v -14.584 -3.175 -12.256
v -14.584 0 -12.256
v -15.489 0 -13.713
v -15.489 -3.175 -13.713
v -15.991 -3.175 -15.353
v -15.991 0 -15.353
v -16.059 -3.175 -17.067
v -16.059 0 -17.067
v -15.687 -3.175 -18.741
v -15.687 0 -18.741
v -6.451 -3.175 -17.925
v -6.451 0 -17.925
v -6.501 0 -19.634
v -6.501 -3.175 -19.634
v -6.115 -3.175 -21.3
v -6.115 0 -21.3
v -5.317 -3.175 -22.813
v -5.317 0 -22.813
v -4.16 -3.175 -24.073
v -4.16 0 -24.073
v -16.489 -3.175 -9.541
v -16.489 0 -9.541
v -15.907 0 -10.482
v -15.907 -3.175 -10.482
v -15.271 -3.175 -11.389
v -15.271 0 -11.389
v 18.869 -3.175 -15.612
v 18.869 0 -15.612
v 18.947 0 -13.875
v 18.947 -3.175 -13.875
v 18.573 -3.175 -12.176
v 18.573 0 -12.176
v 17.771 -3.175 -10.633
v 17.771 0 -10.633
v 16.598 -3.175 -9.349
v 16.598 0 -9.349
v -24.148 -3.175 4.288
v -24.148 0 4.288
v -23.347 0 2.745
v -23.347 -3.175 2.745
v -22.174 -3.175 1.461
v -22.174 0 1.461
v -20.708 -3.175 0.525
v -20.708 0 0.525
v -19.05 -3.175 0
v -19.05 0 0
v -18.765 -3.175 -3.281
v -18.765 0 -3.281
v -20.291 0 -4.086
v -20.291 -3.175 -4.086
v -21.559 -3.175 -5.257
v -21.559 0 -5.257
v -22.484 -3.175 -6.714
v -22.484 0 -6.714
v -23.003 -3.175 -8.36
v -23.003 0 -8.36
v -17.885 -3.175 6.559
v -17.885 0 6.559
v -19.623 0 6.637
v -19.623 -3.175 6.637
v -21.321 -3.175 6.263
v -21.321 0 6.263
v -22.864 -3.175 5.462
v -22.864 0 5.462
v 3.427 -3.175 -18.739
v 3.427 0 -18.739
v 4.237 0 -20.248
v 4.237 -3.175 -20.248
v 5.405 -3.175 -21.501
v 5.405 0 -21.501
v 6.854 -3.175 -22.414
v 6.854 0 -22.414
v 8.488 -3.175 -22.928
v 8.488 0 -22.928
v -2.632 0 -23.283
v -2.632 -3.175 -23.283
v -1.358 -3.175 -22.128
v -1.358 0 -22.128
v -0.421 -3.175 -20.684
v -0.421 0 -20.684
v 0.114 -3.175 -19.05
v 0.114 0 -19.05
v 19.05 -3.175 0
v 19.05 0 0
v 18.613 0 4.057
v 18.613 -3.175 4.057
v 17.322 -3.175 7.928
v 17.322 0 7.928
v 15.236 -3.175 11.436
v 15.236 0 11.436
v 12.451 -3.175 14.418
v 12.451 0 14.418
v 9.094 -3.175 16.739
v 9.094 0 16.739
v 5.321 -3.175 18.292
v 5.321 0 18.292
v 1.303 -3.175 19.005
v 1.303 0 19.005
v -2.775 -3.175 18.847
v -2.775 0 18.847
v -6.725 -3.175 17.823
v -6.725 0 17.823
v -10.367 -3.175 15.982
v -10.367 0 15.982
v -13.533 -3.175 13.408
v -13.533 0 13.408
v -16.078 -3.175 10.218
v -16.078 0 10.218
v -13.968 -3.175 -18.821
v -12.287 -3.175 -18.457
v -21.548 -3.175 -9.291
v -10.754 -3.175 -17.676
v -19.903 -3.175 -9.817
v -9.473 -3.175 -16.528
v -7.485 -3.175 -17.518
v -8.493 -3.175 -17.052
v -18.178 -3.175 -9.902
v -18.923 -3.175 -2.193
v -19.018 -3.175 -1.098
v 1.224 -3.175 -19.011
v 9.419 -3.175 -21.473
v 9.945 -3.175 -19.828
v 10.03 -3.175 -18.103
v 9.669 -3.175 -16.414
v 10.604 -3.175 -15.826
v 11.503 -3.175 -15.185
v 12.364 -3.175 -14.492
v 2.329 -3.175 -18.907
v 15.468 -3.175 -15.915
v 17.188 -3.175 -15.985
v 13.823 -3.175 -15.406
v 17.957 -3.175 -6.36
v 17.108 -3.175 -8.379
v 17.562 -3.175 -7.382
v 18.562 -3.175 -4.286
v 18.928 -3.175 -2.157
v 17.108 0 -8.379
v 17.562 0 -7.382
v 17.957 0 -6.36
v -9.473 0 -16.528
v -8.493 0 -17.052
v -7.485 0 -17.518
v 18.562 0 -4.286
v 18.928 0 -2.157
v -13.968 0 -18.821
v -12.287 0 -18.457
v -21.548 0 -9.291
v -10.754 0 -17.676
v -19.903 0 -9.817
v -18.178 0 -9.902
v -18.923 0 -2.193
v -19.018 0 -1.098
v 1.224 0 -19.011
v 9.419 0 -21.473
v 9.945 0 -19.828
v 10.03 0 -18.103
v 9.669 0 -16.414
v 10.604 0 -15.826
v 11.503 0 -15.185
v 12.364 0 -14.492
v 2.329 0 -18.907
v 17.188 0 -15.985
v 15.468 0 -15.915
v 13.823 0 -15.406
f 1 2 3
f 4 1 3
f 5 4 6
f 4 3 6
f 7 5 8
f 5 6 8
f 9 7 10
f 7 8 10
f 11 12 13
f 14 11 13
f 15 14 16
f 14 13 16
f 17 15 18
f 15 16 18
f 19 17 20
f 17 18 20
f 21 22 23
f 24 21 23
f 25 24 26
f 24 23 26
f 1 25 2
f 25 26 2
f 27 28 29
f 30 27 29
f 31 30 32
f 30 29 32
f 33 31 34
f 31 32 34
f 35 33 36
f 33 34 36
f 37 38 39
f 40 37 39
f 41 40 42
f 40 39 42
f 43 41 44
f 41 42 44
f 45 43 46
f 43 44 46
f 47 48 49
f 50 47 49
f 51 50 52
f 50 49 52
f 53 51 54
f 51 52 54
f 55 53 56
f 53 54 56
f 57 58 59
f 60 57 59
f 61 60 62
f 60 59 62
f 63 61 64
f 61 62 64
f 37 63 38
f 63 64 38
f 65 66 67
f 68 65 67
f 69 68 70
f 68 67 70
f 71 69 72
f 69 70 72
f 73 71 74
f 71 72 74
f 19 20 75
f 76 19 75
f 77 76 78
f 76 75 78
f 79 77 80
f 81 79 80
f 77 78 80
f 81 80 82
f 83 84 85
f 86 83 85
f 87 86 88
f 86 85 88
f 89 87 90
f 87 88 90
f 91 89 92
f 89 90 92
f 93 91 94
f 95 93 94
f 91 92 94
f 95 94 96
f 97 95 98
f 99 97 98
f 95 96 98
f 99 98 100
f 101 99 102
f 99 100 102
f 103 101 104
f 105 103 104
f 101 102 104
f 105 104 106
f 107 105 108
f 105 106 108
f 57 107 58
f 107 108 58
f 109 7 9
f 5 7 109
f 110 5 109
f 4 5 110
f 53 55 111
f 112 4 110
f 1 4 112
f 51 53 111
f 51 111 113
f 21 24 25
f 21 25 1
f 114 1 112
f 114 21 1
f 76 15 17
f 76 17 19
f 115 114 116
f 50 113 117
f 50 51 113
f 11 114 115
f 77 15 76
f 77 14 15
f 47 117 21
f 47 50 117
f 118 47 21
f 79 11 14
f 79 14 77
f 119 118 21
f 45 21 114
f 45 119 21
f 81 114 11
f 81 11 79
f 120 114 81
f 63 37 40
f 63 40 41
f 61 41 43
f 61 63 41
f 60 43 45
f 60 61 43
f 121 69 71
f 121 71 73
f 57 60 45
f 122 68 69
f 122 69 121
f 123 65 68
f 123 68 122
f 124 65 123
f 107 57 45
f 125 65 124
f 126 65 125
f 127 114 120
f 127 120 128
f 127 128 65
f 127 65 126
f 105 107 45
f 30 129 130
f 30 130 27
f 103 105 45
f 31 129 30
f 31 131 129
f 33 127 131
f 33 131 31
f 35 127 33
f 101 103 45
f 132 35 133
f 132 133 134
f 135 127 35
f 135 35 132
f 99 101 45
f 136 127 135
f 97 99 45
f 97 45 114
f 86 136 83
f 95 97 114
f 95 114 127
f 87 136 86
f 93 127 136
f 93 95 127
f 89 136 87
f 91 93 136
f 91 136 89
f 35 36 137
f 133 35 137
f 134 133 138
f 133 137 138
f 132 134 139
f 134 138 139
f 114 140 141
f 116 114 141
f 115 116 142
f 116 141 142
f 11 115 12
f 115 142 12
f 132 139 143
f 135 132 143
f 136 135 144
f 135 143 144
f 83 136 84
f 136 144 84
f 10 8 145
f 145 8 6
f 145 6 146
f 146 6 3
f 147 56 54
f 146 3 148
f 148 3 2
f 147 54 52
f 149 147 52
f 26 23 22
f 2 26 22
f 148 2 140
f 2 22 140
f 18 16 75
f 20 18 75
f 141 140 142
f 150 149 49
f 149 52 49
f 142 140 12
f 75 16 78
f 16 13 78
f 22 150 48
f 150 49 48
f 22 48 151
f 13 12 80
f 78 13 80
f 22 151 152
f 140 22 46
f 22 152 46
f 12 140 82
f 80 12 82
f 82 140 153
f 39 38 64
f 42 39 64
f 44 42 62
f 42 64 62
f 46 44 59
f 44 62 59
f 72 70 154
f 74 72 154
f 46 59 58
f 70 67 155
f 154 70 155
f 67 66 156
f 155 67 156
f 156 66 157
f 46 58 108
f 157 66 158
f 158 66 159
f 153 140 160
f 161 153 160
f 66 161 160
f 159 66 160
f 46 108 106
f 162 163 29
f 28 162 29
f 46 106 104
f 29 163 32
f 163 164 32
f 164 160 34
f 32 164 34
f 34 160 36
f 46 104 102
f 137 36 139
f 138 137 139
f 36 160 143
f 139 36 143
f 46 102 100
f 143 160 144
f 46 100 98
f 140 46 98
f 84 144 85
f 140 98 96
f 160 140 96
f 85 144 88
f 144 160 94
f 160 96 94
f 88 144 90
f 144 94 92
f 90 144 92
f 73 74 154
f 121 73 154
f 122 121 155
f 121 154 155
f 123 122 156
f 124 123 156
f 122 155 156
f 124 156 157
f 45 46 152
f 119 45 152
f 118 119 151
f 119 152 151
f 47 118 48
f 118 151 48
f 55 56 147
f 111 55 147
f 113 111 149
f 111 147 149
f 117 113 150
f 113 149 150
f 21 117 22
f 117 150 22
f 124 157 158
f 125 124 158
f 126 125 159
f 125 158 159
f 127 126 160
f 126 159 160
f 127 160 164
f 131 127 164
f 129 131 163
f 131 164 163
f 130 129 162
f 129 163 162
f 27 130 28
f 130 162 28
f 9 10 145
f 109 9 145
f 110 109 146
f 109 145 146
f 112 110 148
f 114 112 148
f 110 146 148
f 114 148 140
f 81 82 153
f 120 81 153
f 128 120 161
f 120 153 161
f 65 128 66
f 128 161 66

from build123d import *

# Parameters (mm, degrees)
F1_DEPTH = 3.175


# Not quite as in the source:
# - a feature names something its author has since deleted; it is built from what else it names


with BuildPart() as f1:
    # F0 (on Front) → F1 (new body)
    with BuildSketch(Plane.XZ):
        with BuildLine():
            ThreePointArc((-19.05, 0), (-18.7565324084, 3.330914591), (-17.8851714423, 6.5592028846))
            ThreePointArc((-17.8851714423, 6.5592028846), (-21.3208303202, 6.2628506055), (-24.1480220477, 4.2883725643))
            ThreePointArc((-24.1480220477, 4.2883725643), (-22.1735440066, 1.4611808368), (-19.05, 0))
        make_face()
        with BuildLine():
            ThreePointArc((17.9570302857, -6.3598398815), (18.774769332, -3.2265363052), (19.05, 0))
            ThreePointArc((19.05, 0), (3.330914591, 18.7565324084), (-17.8851714423, 6.5592028846))
            ThreePointArc((-17.8851714423, 6.5592028846), (-18.7565324084, 3.330914591), (-19.05, 0))
            ThreePointArc((-19.05, 0), (-18.9787164623, -1.6464572402), (-18.7653993235, -3.2805926645))
            ThreePointArc((-18.7653993235, -3.2805926645), (-17.902768373, -6.5110202414), (-16.4886138833, -9.5408653804))
            ThreePointArc((-16.4886138833, -9.5408653804), (-15.5953963885, -10.940114784), (-14.5837536932, -12.2562893331))
            ThreePointArc((-14.5837536932, -12.2562893331), (-12.2164908848, -14.6171081429), (-9.4729601013, -16.5277199552))
            ThreePointArc((-9.4729601013, -16.5277199552), (-7.9923386115, -17.2923400244), (-6.4505607615, -17.9246413036))
            ThreePointArc((-6.4505607615, -17.9246413036), (-3.2177031841, -18.7762852082), (0.114253165, -19.0496573779))
            ThreePointArc((0.114253165, -19.0496573779), (1.7773096461, -18.9669098807), (3.4267873399, -18.7392536812))
            ThreePointArc((3.4267873399, -18.7392536812), (6.6502136181, -17.8515309941), (9.6687925813, -16.4139254909))
            ThreePointArc((9.6687925813, -16.4139254909), (11.058239811, -15.5118610193), (12.3640641678, -14.4924952045))
            ThreePointArc((12.3640641678, -14.4924952045), (14.707623832, -12.107365577), (16.5980379903, -9.3492050396))
            ThreePointArc((16.5980379903, -9.3492050396), (17.3420662524, -7.8838593403), (17.9570302857, -6.3598398815))
        make_face()
        with BuildLine():
            ThreePointArc((-16.4886138833, -9.5408653804), (-17.902768373, -6.5110202414), (-18.7653993235, -3.2805926645))
            ThreePointArc((-18.7653993235, -3.2805926645), (-21.5590287963, -5.2571672852), (-23.0027619685, -8.3598834163))
            ThreePointArc((-23.0027619685, -8.3598834163), (-19.9027732819, -9.816837479), (-16.4886138833, -9.5408653804))
        make_face()
        with BuildLine():
            ThreePointArc((-9.4729601013, -16.5277199552), (-12.2164908848, -14.6171081429), (-14.5837536932, -12.2562893331))
            ThreePointArc((-14.5837536932, -12.2562893331), (-15.9914516234, -15.352990661), (-15.6868096556, -18.7409643694))
            ThreePointArc((-15.6868096556, -18.7409643694), (-12.286729337, -18.4573983143), (-9.4729601013, -16.5277199552))
        make_face()
        with BuildLine():
            ThreePointArc((-4.1604686233, -24.0732680372), (-1.3577089131, -22.1276679749), (0.114253165, -19.0496573779))
            ThreePointArc((0.114253165, -19.0496573779), (-3.2177031841, -18.7762852082), (-6.4505607615, -17.9246413036))
            ThreePointArc((-6.4505607615, -17.9246413036), (-6.1149672512, -21.3004400299), (-4.1604686233, -24.0732680372))
        make_face()
        with BuildLine():
            ThreePointArc((8.4877873574, -22.928007958), (9.9447352105, -19.8280535223), (9.6687925813, -16.4139254909))
            ThreePointArc((9.6687925813, -16.4139254909), (6.6502136181, -17.8515309941), (3.4267873399, -18.7392536812))
            ThreePointArc((3.4267873399, -18.7392536812), (5.4050438072, -21.50087086), (8.4877873574, -22.928007958))
        make_face()
        with BuildLine():
            ThreePointArc((18.8688683105, -15.6120556451), (18.5725160314, -12.1763967671), (16.5980379903, -9.3492050396))
            ThreePointArc((16.5980379903, -9.3492050396), (14.707623832, -12.107365577), (12.3640641678, -14.4924952045))
            ThreePointArc((12.3640641678, -14.4924952045), (15.4680658678, -15.9145025235), (18.8688683105, -15.6120556451))
        make_face()
    extrude(amount=F1_DEPTH)


solid = f1.part
